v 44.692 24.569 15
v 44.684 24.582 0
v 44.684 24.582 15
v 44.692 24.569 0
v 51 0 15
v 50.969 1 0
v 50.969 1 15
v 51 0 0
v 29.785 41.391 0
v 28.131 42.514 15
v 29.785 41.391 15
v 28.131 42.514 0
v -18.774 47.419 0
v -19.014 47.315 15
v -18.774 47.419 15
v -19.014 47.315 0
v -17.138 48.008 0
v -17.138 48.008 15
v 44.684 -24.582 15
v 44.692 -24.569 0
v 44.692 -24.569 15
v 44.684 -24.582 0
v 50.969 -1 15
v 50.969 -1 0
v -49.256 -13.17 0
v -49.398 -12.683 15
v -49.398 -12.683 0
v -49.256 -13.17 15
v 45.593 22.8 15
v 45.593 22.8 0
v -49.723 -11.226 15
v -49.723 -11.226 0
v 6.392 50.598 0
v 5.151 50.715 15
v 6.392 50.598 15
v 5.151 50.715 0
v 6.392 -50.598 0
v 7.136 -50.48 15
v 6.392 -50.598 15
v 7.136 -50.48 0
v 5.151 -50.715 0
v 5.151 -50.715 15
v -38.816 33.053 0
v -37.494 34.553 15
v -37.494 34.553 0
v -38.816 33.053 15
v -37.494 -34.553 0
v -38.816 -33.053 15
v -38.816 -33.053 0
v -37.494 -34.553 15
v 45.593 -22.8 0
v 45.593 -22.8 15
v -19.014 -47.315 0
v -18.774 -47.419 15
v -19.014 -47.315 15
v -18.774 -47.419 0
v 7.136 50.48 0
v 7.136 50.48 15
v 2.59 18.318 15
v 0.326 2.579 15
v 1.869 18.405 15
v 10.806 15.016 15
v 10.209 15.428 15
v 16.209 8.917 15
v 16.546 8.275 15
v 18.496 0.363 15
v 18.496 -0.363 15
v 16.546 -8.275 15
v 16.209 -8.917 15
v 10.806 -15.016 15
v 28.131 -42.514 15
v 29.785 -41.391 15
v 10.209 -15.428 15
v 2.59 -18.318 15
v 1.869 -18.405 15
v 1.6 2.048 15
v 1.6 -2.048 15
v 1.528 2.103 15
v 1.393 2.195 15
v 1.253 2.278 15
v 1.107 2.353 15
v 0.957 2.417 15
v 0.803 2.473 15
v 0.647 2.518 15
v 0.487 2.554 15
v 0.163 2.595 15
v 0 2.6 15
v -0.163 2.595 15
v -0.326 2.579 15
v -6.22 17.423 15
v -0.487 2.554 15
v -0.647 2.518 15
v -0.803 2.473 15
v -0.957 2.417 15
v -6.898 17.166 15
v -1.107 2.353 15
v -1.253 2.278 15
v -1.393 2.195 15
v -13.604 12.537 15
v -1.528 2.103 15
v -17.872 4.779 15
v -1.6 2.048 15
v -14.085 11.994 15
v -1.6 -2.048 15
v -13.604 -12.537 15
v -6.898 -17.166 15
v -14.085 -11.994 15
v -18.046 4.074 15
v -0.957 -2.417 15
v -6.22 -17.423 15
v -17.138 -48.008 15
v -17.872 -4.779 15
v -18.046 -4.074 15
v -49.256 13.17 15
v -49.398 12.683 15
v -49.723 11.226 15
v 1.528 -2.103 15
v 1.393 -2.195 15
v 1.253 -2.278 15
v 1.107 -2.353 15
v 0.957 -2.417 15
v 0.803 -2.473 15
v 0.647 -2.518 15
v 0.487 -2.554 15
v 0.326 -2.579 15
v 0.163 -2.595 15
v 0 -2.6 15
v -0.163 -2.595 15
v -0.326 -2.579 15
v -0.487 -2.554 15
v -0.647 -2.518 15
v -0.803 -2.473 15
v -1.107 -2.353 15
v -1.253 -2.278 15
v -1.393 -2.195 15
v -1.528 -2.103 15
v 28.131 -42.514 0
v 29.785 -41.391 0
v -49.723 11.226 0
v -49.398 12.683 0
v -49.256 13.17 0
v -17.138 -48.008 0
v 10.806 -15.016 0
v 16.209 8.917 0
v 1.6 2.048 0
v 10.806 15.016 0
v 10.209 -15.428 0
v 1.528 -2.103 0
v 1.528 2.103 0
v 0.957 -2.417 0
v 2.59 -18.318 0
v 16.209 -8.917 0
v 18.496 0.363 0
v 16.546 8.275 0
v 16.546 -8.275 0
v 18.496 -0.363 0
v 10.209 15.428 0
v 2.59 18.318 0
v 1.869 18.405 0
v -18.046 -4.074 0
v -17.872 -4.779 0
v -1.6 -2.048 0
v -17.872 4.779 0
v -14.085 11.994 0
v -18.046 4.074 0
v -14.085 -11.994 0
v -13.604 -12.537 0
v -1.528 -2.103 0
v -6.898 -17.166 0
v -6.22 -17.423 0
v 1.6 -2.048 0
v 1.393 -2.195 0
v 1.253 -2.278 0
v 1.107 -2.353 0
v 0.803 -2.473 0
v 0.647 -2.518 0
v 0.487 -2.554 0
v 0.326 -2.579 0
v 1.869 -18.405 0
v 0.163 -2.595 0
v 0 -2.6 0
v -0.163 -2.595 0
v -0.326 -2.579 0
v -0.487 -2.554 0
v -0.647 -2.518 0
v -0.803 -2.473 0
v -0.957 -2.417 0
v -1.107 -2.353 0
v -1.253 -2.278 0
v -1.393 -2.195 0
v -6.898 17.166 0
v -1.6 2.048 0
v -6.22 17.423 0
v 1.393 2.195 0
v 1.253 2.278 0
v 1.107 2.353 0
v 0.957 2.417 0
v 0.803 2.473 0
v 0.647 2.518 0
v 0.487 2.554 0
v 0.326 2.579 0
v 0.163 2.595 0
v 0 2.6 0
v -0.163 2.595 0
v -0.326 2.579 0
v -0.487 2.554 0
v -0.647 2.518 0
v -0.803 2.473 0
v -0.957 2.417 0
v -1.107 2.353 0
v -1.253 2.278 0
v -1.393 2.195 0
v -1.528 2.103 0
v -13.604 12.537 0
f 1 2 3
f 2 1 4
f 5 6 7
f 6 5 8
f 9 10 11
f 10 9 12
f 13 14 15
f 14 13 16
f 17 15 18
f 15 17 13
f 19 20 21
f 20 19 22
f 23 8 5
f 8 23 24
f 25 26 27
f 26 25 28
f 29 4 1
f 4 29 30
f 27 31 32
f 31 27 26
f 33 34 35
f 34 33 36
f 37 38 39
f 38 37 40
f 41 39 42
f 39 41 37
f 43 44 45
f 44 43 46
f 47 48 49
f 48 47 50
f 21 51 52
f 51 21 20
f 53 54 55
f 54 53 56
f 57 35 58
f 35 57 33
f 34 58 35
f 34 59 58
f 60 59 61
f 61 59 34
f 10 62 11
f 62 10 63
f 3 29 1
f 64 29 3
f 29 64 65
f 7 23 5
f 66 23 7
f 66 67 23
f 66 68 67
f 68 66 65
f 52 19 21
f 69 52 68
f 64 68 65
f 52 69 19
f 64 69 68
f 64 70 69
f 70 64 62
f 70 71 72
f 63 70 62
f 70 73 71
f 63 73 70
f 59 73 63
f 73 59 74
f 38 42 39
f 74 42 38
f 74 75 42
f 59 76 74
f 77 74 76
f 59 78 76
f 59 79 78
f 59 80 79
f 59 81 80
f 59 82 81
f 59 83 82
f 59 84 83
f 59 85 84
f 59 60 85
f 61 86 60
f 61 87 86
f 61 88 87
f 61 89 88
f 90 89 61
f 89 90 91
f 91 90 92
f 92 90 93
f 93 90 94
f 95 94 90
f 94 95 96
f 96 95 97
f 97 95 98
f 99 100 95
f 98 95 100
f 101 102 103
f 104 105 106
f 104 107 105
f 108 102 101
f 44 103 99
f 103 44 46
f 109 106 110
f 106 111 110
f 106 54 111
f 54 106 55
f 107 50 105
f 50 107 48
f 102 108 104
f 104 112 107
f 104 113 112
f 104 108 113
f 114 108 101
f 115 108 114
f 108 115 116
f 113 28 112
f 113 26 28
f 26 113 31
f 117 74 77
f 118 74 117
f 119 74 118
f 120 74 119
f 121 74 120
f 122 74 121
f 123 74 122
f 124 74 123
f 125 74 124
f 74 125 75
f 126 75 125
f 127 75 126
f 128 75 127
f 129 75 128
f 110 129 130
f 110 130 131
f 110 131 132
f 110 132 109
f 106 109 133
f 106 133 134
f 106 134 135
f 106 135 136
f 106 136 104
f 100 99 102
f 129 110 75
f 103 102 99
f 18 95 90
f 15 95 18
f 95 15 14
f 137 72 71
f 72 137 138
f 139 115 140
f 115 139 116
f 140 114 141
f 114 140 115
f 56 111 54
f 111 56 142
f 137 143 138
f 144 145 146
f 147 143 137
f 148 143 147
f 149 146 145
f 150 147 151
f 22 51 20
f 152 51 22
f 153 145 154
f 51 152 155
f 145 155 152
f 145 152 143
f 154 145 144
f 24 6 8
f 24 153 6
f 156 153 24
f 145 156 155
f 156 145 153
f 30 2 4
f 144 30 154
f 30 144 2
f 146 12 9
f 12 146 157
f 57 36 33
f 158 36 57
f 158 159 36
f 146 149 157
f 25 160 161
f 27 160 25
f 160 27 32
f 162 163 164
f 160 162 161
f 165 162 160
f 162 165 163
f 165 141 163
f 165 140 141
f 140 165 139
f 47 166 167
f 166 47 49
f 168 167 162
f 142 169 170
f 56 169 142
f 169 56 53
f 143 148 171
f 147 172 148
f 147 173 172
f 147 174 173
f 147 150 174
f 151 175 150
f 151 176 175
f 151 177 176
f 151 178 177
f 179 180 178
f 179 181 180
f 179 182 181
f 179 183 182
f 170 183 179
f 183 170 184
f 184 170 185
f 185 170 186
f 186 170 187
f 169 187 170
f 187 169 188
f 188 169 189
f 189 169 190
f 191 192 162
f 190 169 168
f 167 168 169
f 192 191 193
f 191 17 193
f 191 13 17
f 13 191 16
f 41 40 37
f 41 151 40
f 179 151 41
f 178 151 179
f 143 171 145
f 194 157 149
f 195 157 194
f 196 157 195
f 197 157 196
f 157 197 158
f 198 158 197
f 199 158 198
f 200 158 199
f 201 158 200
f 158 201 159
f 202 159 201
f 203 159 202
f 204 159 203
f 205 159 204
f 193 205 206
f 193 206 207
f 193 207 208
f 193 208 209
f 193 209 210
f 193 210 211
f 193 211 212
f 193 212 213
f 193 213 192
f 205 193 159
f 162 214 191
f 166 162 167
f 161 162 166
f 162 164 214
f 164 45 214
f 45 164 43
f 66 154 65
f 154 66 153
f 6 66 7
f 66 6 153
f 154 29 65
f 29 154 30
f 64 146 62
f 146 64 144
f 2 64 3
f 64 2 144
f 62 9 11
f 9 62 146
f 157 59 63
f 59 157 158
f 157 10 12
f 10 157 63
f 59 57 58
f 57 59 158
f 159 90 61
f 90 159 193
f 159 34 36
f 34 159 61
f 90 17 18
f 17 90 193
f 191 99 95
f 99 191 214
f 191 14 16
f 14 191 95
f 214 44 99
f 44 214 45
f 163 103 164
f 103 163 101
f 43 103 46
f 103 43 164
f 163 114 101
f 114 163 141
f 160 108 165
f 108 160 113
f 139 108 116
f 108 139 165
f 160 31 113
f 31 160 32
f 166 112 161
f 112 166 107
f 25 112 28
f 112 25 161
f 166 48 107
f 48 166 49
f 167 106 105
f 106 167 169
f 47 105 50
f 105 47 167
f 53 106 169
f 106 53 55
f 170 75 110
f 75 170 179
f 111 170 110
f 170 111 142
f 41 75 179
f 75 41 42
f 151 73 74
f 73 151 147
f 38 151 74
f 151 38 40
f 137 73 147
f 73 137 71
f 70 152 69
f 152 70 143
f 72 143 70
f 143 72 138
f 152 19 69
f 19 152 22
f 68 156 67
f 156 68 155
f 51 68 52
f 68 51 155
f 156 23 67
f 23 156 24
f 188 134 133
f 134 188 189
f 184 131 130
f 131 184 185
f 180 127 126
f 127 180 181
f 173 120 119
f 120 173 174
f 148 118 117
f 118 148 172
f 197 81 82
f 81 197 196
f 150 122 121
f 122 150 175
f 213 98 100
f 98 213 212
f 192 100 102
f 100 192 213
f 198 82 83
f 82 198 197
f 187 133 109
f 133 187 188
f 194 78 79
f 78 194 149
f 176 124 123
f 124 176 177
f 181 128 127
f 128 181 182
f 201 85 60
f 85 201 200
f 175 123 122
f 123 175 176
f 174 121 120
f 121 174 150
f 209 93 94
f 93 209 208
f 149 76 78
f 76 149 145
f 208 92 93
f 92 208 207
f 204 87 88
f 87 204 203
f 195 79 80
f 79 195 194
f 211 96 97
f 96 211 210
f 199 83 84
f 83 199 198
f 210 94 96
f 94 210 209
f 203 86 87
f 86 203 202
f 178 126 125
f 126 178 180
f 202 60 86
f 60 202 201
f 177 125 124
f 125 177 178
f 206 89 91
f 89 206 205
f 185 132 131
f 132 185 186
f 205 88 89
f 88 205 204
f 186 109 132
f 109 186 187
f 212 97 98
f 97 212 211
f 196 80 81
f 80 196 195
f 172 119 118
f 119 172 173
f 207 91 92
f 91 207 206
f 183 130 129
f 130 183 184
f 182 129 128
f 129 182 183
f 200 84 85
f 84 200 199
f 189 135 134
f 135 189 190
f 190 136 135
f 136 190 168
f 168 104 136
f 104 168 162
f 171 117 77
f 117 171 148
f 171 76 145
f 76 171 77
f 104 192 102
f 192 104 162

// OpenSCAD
// Medify - Floor 2: The Windmail (Verified Final Version)
$fn = 100;

// --- פרמטרים הנדסיים ---
outer_dia = 102;      
height = 15;          
wall_thickness = 2.0; 
compartments = 13;
center_core_r = 16;   

angle_per_comp = 360 / compartments;
wall_angle = (wall_thickness * 360) / (PI * outer_dia); 
cutout_angle = angle_per_comp - wall_angle;

difference() {
    union() {
        // 1. הגוף המרכזי
        cylinder(h = height, d = outer_dia);
        
        // 2. ליבה מרכזית מעובה (Hub) שמחברת את הקירות
        cylinder(h = height, r = center_core_r + 2.5);
    }

    // 3. חיתוך 13 התאים
    for (i = [0 : compartments - 1]) {
        rotate([0, 0, i * angle_per_comp + wall_angle/2])
        intersection() {
            translate([0, 0, -1]) cylinder(h = height + 2, r = outer_dia/2 + 2);
            linear_extrude(height = height + 2)
                polygon(points=[
                    [center_core_r + 2.5, 0], 
                    [outer_dia + 2, 0],
                    [outer_dia * 2 * cos(cutout_angle), outer_dia * 2 * sin(cutout_angle)],
                    [(center_core_r + 2.5) * cos(cutout_angle), (center_core_r + 2.5) * sin(cutout_angle)]
                ]);
        }
    }

    // 4. חור הציר המקורי שלך - Double-D Shaft (זהה לחלוטין לקוד המקורי)
    translate([0, 0, -1])
    intersection() {
        cylinder(h = height + 2, d = 5.2); 
        translate([0, 0, (height + 2)/2])
            cube([3.2, 10, height + 2], center = true);
    }
}
